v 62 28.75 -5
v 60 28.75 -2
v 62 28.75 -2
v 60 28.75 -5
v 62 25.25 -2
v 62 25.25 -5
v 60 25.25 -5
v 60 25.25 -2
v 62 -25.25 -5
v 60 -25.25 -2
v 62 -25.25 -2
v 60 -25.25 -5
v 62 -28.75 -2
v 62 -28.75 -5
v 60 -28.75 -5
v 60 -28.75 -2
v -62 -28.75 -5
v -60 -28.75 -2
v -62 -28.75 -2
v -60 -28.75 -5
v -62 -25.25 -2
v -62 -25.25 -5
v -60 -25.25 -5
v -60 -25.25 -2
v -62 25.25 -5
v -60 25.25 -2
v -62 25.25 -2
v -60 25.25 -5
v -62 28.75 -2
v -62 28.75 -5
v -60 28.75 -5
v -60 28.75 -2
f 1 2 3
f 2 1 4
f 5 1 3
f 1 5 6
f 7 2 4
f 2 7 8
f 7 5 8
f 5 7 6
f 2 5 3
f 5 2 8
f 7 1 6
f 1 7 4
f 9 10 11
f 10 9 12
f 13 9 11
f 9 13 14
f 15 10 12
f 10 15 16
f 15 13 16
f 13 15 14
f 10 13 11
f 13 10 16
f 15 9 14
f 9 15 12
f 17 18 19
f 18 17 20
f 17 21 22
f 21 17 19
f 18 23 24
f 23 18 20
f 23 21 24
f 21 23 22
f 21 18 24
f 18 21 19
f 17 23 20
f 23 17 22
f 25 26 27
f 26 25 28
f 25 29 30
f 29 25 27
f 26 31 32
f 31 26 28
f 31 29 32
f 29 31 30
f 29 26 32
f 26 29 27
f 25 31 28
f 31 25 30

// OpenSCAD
module led_holder(){
		rotate([90,0,0])difference(){
		union(){
			cylinder(r=3, h=3, $fn=100, center=true);
			translate([0,-2.5,0])cube([5,2,3], center=true, $fn=100);
		}
		cylinder(r=1.5, h=6, $fn=100, center=true);
	}
}

module frame(){
	union(){
		difference(){
			union(){
				intersection(){
					linear_extrude(height = 15, center = true, convexity = 10, $fn=100)
						import (file = "frame.dxf", layer = "frame");
					translate([0,0,-5])rotate([90,0,0])linear_extrude(height = 80, center = true, convexity = 10, $fn=100)
						import (file = "frame.dxf", layer = "front_profile");	
				}
			}
			
			translate([0,0,-1.8])cube([20,50,5], center=true);
			translate([9,0,-2.3])rotate([90,0,0])cylinder(r=2, h=55, center=true, $fn=100);
			translate([-9,0,-2.3])rotate([90,0,0])cylinder(r=2, h=55, center=true, $fn=100);

			color([0.3,0.3,0.0])translate([32.5, 32.5,-4])cylinder(r=3.5, h=10, $fn=100);
			color([0.3,0.3,0.0])translate([-32.5, 32.5,-4])cylinder(r=3.5, h=10, $fn=100);
			color([0.3,0.3,0.0])translate([32.5, -32.5,-4])cylinder(r=3.5, h=10, $fn=100);
			color([0.3,0.3,0.0])translate([-32.5, -32.5,-4])cylinder(r=3.5, h=10, $fn=100);


			color([0.3,0.3,0.0])translate([-32.5, -32.5,-2.5])difference(){
				translate([0,0,5.1])cube([30,30,10], center = true);
				cylinder(r1=6,r2=4.5 , h=8, $fn=100);
			}


			color([0.3,0.3,0.0])translate([-32.5, 32.5,-2.5])difference(){
				translate([0,0,5.1])cube([30,30,10], center = true);
				cylinder(r1=6,r2=4.5 , h=8, $fn=100);
			}

			color([0.3,0.3,0.0])translate([32.5, -32.5,-2.5])difference(){
				translate([0,0,5.1])cube([30,30,10], center = true);
				cylinder(r1=6,r2=4.5 , h=8, $fn=100);
			}

			color([0.3,0.3,0.0])translate([32.5, 32.5,-2.5])difference(){
				translate([0,0,5.1])cube([30,30,10], center = true);
				cylinder(r1=6,r2=4.5 , h=8, $fn=100);
			}


		}
		intersection(){

			linear_extrude(height = 15, center = true, convexity = 10, $fn=100)
				import (file = "frame.dxf", layer = "frame_strengthners");

			translate([0,0,-5])rotate([90,0,0])linear_extrude(height = 80, center = true, convexity = 10, $fn=100)
				import (file = "frame.dxf", layer = "strengthners_profile");	
		}
	}
}


module stand(){
	intersection(){
		rotate([90,0,0])linear_extrude(height = 8, center = true, convexity = 10, $fn=200, center=true)
			import (file = "frame.dxf", layer = "stands_top");
			//translate([35.5778/2,0,0])cylinder(r=1.9, h=0.5, $fn=100);
			//translate([-35.5778/2,0,0])cylinder(r=1.9, h=0.5, $fn=100);
		rotate([0,0,0])linear_extrude(height = 30, center = true, convexity = 10, $fn=200, center=true)
			import (file = "frame.dxf", layer = "stands_profile");
	}
	
	translate([25.25,-0.5,10])cube([3.5,3,2]);
	translate([-28.75,-0.5,10])cube([3.5,3,2]);
}


frame();
translate([50,0,-4.5])rotate([90,0,90])stand();
translate([-50,0,-4.5])rotate([90,0,-90])stand();
